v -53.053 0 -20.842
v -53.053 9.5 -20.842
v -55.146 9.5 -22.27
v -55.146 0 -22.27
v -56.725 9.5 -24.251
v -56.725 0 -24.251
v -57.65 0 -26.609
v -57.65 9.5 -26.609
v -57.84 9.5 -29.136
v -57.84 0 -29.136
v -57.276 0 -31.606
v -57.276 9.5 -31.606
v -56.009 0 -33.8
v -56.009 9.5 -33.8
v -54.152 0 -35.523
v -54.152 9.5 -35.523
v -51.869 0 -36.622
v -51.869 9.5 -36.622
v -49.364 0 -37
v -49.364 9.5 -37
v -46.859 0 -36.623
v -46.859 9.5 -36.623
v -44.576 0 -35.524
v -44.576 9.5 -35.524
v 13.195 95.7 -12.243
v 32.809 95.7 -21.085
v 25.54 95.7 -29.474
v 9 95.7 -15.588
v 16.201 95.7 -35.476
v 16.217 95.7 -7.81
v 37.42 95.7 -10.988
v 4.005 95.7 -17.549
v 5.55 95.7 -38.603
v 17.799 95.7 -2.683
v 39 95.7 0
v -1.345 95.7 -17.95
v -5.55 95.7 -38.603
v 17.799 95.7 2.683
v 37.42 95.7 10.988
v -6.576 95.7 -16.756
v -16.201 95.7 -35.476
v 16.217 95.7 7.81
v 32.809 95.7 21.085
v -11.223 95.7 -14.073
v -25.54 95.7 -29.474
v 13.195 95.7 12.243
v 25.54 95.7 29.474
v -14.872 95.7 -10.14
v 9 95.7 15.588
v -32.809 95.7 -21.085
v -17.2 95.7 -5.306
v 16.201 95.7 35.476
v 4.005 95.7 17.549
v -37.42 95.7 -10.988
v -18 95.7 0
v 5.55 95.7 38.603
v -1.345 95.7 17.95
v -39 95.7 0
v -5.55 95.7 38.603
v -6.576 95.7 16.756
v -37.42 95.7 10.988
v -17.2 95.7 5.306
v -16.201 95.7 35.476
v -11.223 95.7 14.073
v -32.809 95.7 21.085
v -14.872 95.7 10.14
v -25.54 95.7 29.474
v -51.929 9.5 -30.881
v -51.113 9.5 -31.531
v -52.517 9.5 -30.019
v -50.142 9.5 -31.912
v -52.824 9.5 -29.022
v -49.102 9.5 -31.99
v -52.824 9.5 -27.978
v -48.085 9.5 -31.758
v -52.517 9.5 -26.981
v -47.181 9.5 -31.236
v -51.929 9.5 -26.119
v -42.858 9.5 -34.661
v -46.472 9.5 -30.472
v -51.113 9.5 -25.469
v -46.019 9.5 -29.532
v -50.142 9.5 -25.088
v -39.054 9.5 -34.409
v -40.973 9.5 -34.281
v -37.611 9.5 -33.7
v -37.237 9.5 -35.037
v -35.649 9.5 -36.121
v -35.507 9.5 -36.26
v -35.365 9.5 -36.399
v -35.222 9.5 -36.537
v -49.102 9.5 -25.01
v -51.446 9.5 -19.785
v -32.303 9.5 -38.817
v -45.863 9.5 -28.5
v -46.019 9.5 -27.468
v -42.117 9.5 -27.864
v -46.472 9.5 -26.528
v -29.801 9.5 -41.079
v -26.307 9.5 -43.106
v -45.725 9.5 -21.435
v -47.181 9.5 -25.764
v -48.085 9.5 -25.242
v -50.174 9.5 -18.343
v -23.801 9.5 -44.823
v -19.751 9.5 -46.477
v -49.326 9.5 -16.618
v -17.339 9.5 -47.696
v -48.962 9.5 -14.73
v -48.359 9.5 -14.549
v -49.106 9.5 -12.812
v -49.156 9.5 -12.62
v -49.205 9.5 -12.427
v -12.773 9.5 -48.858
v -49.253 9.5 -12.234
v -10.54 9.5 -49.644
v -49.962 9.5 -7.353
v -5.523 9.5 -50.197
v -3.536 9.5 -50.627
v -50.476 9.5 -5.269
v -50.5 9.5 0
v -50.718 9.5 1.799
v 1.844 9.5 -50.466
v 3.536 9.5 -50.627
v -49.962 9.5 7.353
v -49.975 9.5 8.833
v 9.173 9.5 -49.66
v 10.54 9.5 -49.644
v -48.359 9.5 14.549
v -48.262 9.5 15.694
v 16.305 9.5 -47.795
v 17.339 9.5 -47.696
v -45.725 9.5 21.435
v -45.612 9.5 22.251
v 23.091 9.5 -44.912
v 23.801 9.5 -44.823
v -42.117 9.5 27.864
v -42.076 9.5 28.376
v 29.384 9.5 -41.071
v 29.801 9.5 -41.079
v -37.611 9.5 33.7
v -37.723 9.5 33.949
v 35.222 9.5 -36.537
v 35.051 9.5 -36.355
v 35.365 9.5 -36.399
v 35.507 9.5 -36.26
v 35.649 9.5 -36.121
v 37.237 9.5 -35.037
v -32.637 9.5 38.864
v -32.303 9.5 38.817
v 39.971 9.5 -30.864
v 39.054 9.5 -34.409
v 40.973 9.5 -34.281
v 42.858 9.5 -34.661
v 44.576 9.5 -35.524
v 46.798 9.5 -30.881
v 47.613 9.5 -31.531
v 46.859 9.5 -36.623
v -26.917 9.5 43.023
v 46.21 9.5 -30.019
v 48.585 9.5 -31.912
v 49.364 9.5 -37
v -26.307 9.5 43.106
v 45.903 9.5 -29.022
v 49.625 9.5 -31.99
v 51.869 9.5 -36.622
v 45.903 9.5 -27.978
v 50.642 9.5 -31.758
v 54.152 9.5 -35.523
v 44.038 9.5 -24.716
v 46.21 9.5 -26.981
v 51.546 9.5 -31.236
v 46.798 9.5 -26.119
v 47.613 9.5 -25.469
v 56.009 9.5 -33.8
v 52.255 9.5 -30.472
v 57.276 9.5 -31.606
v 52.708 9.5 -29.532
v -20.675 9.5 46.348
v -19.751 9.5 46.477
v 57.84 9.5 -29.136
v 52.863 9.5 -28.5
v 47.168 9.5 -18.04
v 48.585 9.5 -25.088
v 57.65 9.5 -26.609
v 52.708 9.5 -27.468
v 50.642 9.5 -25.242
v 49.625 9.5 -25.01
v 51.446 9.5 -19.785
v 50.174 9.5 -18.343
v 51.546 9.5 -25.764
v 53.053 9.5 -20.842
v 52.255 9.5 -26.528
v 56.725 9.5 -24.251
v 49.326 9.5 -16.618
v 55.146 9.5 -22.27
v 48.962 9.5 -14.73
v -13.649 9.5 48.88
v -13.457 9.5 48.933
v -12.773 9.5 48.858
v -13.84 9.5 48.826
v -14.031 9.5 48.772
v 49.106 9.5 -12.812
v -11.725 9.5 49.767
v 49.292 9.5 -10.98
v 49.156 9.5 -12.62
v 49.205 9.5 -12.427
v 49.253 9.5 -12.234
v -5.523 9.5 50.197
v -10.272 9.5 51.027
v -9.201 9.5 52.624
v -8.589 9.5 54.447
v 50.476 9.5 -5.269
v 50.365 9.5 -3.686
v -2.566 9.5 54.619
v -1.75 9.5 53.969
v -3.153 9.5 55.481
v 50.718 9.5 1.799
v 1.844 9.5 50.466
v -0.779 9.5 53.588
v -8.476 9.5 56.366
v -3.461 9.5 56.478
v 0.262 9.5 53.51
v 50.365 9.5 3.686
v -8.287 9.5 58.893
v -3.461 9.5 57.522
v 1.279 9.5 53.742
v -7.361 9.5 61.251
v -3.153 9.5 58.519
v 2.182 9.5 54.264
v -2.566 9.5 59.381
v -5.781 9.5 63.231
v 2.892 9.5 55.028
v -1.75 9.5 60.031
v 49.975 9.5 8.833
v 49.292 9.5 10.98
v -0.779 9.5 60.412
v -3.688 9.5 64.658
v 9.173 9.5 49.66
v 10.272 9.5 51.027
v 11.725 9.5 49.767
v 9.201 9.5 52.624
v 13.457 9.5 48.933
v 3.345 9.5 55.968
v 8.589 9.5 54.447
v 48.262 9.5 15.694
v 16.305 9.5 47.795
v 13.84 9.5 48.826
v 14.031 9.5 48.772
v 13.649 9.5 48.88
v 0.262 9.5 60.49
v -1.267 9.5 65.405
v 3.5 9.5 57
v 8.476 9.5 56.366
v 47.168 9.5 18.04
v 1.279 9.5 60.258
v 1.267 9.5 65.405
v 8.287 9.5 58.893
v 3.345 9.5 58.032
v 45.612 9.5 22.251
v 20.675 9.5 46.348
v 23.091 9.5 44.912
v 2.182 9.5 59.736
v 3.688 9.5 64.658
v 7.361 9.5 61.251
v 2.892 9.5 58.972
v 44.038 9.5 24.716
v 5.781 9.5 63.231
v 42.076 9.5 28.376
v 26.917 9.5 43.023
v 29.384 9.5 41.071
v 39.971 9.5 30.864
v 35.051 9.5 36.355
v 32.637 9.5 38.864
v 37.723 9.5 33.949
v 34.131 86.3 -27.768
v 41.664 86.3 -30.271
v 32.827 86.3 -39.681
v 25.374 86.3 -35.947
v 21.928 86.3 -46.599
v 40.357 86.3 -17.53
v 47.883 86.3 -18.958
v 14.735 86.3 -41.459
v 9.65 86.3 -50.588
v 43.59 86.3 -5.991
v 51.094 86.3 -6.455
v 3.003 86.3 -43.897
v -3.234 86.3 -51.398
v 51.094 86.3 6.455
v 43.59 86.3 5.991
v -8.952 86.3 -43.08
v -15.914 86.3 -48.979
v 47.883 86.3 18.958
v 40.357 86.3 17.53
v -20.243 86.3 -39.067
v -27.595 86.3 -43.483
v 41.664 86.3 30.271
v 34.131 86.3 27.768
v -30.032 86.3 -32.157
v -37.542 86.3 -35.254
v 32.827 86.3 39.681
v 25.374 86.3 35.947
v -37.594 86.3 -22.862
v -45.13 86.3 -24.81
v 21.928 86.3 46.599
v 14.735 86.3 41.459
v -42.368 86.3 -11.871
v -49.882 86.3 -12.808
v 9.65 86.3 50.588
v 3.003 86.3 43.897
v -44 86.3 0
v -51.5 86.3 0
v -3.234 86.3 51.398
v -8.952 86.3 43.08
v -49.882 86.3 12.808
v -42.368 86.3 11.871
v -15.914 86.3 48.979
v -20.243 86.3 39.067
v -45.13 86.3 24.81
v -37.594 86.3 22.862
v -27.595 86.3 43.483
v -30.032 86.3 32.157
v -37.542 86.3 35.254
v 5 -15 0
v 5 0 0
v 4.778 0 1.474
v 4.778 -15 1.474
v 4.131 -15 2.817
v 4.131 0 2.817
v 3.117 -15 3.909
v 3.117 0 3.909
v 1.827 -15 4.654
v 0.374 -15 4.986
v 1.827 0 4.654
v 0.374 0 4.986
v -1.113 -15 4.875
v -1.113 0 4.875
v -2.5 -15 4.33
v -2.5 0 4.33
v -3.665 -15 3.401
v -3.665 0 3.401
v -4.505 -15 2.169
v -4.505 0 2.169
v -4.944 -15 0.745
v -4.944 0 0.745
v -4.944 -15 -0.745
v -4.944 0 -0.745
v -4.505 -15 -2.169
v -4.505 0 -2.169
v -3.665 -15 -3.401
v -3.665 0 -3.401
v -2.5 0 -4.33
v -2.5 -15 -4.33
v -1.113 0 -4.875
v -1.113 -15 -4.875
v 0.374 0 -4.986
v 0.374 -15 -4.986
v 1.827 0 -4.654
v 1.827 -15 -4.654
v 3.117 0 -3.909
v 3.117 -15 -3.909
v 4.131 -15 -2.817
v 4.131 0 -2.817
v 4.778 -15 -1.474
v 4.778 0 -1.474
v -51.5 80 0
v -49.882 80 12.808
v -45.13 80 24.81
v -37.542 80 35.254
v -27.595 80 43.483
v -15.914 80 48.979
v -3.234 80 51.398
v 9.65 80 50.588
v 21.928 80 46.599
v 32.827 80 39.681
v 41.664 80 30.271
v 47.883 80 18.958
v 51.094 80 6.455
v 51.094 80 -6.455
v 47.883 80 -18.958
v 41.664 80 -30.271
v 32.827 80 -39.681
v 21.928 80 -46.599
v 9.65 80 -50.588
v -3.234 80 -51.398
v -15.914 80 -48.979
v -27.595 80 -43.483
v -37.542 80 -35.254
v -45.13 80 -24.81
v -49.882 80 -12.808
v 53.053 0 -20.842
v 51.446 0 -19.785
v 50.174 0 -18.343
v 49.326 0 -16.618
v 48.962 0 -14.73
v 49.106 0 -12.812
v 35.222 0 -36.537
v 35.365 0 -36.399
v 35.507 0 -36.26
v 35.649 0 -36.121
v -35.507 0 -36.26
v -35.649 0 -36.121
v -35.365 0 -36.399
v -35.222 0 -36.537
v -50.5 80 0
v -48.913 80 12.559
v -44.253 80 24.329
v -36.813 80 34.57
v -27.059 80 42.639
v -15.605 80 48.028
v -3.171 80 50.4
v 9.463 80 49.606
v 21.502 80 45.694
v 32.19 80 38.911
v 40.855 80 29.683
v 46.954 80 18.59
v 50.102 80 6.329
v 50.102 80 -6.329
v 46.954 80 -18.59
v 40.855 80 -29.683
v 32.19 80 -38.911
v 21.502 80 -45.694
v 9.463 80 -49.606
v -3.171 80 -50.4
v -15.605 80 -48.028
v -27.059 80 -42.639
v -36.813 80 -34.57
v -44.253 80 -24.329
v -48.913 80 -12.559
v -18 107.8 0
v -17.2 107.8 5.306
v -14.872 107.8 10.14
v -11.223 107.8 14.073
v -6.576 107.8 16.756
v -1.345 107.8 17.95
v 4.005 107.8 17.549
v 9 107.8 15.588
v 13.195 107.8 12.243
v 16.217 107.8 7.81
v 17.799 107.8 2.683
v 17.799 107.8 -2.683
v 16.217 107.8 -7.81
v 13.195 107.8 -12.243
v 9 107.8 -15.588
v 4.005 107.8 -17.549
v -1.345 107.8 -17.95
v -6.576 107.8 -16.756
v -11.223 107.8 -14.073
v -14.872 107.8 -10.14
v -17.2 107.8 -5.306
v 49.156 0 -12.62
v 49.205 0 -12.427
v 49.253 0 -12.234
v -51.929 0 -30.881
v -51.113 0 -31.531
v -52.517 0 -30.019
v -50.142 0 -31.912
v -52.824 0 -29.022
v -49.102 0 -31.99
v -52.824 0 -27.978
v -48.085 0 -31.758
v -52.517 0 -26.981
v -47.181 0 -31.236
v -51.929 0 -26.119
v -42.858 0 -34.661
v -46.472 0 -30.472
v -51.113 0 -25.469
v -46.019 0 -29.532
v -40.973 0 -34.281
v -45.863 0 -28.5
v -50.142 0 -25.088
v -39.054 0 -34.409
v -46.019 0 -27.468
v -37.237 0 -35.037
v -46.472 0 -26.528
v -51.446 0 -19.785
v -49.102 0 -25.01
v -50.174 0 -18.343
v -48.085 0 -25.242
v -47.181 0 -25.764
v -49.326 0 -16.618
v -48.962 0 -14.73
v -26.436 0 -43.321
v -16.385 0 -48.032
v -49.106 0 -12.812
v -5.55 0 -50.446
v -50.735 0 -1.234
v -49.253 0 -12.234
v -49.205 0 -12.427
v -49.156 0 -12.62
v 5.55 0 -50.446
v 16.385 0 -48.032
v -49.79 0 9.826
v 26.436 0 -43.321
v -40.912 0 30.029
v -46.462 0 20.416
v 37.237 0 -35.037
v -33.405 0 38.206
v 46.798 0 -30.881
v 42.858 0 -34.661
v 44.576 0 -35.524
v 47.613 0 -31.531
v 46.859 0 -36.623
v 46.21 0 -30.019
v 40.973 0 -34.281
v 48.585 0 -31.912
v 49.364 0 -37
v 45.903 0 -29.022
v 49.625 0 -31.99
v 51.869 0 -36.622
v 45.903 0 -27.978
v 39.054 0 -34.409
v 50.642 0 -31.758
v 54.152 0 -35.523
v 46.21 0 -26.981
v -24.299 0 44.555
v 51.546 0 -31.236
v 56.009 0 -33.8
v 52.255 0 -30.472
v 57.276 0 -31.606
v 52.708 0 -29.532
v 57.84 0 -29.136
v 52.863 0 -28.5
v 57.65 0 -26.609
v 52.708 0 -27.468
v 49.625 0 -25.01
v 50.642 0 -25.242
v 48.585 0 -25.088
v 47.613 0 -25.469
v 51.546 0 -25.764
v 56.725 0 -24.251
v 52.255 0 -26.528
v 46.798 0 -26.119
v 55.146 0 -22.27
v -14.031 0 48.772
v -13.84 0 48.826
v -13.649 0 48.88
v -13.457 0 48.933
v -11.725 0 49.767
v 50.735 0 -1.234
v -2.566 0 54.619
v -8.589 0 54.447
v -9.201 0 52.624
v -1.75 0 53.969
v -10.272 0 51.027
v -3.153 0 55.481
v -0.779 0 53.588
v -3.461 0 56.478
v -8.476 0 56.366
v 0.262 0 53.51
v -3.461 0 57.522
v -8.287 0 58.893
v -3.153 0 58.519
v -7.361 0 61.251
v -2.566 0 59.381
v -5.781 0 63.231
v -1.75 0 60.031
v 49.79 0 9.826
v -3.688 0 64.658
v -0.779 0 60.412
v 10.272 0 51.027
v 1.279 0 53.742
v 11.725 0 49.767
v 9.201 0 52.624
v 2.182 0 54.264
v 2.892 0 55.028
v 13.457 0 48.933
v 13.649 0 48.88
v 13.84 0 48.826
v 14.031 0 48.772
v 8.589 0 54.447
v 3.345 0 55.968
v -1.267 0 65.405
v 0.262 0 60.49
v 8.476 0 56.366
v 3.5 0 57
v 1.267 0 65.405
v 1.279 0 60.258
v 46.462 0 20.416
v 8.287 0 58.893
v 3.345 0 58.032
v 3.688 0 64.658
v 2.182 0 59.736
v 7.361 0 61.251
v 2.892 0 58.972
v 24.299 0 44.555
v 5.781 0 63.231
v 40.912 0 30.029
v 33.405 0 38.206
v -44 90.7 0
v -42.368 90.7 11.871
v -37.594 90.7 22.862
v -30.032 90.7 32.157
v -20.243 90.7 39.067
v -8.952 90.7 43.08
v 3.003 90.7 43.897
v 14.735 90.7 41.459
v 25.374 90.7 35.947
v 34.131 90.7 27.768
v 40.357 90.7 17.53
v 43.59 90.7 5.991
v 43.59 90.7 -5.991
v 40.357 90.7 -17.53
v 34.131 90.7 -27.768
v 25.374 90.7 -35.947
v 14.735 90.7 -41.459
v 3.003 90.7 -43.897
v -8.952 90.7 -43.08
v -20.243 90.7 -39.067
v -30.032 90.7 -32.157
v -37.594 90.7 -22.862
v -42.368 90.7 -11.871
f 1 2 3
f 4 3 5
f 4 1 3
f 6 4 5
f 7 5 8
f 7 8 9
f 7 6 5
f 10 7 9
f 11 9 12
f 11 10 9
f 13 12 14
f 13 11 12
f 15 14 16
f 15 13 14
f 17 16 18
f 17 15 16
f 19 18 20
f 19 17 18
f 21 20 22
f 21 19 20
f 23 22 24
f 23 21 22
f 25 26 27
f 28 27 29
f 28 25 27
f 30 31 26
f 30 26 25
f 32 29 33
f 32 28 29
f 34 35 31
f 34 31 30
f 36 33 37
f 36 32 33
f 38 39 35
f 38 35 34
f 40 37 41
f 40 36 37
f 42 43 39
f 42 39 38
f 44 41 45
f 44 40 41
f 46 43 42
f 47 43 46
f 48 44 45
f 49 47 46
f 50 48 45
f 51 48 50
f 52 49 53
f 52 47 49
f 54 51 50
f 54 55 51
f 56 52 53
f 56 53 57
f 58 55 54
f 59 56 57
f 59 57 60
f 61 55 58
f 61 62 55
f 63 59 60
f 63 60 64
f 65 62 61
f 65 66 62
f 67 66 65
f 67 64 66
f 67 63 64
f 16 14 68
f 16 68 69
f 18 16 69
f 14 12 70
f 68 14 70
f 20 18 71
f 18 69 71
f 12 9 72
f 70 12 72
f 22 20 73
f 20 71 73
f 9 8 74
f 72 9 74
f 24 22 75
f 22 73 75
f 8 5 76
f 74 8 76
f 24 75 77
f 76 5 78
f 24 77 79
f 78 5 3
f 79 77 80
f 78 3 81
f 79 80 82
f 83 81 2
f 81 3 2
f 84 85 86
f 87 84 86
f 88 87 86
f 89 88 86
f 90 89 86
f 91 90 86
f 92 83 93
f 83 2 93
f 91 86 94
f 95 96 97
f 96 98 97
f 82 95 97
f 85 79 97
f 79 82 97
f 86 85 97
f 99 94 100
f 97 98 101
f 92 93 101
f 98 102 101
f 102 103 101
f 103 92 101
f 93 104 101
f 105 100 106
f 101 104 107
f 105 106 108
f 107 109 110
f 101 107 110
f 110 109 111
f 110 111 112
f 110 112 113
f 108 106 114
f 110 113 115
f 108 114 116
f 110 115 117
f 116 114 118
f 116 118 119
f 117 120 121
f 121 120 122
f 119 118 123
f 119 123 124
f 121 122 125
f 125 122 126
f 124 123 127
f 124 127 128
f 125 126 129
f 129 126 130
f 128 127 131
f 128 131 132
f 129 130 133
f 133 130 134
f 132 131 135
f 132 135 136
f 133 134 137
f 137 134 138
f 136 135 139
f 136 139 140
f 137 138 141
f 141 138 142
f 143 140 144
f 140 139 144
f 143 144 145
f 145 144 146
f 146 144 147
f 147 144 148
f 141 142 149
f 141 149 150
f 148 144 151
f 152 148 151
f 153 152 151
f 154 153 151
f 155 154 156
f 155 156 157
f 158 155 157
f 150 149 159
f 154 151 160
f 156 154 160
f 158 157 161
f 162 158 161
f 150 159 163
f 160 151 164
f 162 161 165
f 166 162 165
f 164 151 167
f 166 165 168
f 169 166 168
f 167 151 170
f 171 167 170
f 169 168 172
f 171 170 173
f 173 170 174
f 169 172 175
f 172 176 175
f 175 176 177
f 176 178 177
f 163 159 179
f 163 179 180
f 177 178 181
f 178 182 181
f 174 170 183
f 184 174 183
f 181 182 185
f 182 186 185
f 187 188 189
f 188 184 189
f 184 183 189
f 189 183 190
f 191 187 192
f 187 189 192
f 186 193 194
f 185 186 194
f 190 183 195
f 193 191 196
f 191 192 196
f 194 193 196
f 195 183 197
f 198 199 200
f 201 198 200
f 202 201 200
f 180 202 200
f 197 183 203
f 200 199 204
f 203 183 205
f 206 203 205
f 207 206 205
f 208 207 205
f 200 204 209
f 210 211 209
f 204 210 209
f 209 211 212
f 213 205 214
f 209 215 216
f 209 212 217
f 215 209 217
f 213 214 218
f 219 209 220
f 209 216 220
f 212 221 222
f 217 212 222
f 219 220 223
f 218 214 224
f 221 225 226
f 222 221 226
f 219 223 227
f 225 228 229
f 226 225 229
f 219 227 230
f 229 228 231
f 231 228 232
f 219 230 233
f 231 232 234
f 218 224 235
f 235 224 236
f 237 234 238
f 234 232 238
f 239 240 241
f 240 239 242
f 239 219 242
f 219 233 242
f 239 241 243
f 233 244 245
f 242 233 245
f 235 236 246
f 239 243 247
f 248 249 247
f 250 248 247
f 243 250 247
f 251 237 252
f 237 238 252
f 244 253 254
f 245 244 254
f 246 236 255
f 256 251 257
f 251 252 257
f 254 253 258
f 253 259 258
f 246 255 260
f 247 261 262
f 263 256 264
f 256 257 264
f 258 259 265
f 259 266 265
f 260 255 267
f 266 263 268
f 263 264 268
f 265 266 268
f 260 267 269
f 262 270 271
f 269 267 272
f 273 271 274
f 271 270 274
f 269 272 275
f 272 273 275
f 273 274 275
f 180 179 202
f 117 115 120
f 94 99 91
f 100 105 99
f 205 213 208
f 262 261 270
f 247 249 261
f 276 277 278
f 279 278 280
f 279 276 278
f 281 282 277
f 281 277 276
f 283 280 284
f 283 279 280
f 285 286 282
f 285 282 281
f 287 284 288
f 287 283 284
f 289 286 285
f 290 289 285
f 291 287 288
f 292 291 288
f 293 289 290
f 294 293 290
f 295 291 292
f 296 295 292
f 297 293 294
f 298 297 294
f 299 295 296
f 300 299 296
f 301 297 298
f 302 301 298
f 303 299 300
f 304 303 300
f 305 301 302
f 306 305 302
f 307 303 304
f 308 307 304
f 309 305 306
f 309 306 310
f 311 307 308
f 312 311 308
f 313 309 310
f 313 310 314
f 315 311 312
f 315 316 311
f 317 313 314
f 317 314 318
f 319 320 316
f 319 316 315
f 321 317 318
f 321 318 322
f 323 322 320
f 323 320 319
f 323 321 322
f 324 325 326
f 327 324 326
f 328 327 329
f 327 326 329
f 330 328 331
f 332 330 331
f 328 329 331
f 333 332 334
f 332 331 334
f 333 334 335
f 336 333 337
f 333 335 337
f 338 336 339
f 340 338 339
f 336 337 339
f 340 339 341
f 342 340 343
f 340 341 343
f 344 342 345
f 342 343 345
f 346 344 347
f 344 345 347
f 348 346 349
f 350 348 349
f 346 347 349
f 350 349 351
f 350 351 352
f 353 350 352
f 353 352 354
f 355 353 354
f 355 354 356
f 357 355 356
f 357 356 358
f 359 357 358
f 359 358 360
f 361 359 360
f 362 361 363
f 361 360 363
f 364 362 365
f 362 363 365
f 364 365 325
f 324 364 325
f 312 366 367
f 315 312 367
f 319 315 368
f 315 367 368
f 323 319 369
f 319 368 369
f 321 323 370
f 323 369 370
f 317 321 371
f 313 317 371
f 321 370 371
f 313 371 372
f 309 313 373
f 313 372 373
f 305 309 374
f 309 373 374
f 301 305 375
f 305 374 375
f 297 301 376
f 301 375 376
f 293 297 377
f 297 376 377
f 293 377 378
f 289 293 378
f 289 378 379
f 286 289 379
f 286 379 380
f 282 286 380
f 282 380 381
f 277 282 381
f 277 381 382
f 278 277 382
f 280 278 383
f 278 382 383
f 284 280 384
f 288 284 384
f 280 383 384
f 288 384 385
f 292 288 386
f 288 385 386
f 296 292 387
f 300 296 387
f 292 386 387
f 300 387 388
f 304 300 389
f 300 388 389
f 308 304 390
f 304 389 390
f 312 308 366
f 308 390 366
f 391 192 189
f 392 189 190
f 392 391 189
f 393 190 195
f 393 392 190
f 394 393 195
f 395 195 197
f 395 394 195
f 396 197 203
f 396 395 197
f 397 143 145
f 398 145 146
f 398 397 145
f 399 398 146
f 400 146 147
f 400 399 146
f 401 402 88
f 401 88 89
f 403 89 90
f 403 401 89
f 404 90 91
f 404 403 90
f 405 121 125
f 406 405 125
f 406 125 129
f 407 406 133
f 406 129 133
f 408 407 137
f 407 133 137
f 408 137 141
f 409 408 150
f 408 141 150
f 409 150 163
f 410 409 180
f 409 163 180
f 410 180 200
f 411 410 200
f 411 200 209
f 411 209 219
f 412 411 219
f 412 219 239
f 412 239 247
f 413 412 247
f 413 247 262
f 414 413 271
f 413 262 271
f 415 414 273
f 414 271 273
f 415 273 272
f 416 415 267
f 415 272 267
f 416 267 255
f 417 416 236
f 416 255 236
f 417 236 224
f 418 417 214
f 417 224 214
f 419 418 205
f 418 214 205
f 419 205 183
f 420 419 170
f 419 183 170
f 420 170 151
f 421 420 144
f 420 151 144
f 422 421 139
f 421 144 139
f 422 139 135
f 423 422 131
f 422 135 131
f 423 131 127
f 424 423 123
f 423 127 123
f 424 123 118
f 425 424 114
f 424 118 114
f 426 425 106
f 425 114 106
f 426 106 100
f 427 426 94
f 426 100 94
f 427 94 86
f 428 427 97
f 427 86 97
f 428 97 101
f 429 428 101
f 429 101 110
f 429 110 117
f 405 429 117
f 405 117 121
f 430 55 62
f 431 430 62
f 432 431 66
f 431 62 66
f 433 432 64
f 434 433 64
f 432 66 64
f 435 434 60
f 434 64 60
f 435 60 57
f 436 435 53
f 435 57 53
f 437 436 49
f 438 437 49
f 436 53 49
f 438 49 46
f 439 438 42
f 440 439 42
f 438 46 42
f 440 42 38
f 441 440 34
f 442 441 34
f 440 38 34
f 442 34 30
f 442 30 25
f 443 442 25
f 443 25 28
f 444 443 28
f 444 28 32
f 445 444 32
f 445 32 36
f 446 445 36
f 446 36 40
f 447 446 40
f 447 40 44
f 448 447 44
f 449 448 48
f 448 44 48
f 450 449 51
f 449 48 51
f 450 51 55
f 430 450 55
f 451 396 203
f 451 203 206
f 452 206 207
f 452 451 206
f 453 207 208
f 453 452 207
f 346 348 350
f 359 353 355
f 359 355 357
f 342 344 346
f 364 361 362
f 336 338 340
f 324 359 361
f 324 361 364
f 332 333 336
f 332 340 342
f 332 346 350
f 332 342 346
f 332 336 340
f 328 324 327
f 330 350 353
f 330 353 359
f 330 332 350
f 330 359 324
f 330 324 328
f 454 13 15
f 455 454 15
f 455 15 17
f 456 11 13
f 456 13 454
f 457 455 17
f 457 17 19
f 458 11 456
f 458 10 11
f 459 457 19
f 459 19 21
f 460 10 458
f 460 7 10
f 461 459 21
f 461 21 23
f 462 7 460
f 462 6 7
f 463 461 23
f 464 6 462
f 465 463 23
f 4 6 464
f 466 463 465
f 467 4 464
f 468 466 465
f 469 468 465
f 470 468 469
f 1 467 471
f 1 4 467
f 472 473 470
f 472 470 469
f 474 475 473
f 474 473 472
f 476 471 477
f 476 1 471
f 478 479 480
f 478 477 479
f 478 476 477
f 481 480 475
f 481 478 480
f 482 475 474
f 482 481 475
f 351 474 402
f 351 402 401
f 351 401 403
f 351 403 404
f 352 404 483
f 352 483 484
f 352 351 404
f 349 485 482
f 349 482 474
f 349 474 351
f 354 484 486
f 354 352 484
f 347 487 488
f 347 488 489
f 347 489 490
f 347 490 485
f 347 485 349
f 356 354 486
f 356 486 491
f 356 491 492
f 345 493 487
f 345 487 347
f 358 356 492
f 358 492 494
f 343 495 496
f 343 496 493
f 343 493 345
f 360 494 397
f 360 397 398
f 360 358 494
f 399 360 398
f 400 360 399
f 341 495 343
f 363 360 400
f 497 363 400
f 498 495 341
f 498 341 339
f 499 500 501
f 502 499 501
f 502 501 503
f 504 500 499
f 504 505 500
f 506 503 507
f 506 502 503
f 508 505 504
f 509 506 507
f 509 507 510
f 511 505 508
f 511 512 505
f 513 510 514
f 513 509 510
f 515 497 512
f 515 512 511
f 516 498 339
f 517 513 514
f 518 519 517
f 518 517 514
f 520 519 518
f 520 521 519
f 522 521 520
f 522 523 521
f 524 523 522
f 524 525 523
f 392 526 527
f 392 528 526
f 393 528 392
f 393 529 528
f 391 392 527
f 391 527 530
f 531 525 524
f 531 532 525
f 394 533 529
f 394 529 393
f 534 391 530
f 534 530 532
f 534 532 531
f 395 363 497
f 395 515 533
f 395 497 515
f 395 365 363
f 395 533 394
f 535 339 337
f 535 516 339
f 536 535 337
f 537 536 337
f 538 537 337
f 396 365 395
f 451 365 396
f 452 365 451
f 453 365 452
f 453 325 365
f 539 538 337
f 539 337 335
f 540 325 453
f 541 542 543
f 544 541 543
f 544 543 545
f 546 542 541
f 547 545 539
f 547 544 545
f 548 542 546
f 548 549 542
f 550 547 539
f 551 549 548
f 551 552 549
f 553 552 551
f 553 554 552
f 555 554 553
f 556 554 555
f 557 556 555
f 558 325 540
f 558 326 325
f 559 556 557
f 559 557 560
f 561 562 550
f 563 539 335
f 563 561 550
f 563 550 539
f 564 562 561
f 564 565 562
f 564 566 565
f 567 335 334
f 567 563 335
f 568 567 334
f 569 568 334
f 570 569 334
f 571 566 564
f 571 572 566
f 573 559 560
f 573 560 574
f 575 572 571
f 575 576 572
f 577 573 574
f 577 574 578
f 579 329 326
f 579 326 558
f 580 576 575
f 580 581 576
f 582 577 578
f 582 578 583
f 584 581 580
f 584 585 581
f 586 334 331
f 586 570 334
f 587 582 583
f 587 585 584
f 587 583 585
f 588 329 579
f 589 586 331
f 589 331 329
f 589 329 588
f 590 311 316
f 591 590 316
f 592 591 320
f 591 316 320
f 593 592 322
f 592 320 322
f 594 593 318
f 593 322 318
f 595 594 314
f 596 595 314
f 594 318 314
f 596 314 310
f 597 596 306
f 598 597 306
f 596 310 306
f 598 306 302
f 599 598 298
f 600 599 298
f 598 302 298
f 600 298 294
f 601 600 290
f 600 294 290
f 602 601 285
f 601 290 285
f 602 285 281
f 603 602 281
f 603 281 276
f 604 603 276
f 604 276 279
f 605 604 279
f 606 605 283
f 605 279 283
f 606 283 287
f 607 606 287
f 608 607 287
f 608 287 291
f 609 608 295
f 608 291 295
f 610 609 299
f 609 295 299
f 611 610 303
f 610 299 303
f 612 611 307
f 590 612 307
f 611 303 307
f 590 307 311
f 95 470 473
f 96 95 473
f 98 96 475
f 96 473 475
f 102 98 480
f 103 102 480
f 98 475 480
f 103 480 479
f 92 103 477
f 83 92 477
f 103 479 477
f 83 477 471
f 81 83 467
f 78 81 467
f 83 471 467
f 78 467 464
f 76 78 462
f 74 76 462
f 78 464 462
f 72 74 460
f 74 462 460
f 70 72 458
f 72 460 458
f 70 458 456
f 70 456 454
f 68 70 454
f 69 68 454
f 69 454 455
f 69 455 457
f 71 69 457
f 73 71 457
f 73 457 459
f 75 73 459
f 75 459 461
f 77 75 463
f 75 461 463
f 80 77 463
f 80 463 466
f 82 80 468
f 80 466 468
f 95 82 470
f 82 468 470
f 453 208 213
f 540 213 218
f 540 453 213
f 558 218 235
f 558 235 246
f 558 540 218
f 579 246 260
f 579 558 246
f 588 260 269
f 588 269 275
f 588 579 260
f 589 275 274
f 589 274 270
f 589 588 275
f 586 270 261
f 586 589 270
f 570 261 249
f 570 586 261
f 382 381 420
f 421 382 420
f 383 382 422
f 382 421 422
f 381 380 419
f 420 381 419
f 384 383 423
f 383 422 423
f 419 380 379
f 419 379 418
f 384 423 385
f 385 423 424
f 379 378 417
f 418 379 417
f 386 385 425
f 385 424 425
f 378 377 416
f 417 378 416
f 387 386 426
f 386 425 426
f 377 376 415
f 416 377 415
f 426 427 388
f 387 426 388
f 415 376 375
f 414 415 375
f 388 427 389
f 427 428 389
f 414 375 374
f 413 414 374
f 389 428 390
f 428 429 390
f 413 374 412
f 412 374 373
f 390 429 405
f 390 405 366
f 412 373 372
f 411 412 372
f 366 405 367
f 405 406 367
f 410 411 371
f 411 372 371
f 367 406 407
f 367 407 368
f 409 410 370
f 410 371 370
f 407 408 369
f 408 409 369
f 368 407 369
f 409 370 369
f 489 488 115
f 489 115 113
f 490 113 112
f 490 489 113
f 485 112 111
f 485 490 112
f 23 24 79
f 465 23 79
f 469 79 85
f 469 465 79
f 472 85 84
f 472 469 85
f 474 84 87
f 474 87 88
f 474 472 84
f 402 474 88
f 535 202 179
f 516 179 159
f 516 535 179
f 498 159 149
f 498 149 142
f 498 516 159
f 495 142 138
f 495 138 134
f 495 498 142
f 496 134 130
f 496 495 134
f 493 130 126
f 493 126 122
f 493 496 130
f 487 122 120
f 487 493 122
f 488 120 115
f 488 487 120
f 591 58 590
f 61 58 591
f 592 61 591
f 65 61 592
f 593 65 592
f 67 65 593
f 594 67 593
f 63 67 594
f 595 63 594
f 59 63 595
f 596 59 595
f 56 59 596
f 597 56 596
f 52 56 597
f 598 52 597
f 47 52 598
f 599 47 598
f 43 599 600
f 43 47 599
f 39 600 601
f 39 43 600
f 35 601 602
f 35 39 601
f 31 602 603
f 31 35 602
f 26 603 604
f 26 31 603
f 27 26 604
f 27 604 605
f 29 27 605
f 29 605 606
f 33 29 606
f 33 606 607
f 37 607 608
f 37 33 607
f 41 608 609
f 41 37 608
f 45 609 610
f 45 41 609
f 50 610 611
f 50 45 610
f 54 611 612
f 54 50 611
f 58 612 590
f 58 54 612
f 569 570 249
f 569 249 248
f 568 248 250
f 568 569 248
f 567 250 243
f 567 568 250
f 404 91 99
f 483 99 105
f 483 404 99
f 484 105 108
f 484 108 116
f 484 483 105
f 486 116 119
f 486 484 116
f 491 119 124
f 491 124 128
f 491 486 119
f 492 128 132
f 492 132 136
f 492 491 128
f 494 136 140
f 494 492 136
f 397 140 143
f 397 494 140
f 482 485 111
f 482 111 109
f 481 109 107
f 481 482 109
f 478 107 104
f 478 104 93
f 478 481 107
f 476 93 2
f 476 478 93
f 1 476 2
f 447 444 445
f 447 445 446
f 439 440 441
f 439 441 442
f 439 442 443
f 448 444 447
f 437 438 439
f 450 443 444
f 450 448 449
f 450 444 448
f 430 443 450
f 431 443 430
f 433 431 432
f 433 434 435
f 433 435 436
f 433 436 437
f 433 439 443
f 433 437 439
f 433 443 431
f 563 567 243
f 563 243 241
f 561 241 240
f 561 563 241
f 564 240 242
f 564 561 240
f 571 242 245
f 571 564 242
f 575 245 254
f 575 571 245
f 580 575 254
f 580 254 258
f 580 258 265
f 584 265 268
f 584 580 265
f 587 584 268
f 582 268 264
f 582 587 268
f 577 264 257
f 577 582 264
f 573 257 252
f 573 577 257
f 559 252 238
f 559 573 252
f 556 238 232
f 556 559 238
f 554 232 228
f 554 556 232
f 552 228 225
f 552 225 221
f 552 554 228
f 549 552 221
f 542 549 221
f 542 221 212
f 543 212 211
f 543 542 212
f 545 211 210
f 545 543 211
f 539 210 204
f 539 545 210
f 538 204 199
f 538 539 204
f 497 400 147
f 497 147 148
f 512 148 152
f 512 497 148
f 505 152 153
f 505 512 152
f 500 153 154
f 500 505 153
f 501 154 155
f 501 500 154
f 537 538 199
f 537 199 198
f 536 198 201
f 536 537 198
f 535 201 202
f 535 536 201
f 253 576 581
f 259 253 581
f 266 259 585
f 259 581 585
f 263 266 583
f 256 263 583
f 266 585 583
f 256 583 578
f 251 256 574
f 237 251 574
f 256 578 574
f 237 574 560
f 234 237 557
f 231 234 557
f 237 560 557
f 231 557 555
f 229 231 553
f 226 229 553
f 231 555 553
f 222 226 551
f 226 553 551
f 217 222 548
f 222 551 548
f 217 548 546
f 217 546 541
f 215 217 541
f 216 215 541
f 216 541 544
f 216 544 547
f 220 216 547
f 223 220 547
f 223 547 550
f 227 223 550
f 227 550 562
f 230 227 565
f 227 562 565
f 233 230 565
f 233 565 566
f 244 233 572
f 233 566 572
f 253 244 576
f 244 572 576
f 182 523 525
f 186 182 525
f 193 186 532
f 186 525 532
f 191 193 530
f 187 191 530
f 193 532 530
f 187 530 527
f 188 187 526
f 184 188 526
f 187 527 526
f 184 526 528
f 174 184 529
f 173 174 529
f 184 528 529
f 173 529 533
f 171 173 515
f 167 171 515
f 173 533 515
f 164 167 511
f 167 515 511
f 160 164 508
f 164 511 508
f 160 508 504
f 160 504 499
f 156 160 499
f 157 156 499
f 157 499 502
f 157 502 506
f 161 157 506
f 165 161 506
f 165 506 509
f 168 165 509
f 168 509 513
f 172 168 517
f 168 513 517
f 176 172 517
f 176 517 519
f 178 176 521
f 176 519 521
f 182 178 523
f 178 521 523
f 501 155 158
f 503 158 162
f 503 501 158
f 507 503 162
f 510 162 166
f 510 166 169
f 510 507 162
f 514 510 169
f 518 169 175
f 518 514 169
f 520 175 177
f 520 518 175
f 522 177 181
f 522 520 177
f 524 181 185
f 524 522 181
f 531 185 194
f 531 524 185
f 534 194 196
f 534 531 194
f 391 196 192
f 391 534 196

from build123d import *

# Parameters (mm, degrees)
F0_R      = 3.5
F2_DEPTH  = 9.5
F1_R      = 5
F3_DEPTH  = 15
F4_R      = 50.5
F5_DEPTH  = 70.5
F6_R      = 51.5
F7_DEPTH  = 6.3
F8_R      = 44
F9_DEPTH  = 9.4
F10_R     = 18
F11_DEPTH = 12.1
F15_SIZE  = 5


with BuildPart() as f2:
    # F0 (on Front) → F2 (new body)
    with BuildSketch(Plane.XZ):
        with BuildLine():
            ThreePointArc((-14.031232, 48.771785), (-13.742652, 48.846608), (-13.457391, 48.933231))
            ThreePointArc((-13.457391, 48.933231), (-13.744549, 48.853351), (-14.031232, 48.771785))
        make_face()
        with BuildLine():
            ThreePointArc((-8.47634, 56.366228), (-9.68343, 51.789665), (-13.457391, 48.933231))
            ThreePointArc((-13.457391, 48.933231), (-13.742652, 48.846608), (-14.031232, 48.771785))
            ThreePointArc((-14.031232, 48.771785), (-43.950789, 25.375), (-49.253221, -12.234489))
            ThreePointArc((-49.253221, -12.234489), (-49.173729, -12.521818), (-49.106117, -12.812173))
            ThreePointArc((-49.106117, -12.812173), (-49.69288, -17.508736), (-53.052755, -20.842389))
            ThreePointArc((-53.052755, -20.842389), (-56.724664, -32.75), (-44.576416, -35.523839))
            ThreePointArc((-44.576416, -35.523839), (-40.009451, -34.280929), (-35.648726, -36.121058))
            ThreePointArc((-35.648726, -36.121058), (-35.431077, -36.324789), (-35.221989, -36.537296))
            ThreePointArc((-35.221989, -36.537296), (0, -50.75), (35.221989, -36.537296))
            ThreePointArc((35.221989, -36.537296), (35.431077, -36.324789), (35.648726, -36.121058))
            ThreePointArc((35.648726, -36.121058), (40.009451, -34.280929), (44.576416, -35.523839))
            ThreePointArc((44.576416, -35.523839), (56.724664, -32.75), (53.052755, -20.842389))
            ThreePointArc((53.052755, -20.842389), (49.69288, -17.508736), (49.106117, -12.812173))
            ThreePointArc((49.106117, -12.812173), (49.173729, -12.521818), (49.253221, -12.234489))
            ThreePointArc((49.253221, -12.234489), (43.950789, 25.375), (14.031232, 48.771785))
            ThreePointArc((14.031232, 48.771785), (13.742652, 48.846608), (13.457391, 48.933231))
            ThreePointArc((13.457391, 48.933231), (9.68343, 51.789665), (8.47634, 56.366228))
            ThreePointArc((8.47634, 56.366228), (0, 65.5), (-8.47634, 56.366228))
        make_face()
        with Locations((-49.363448, -28.5)):
            Circle(F0_R, mode=Mode.SUBTRACT)
        with Locations((49.363448, -28.5)):
            Circle(F0_R, mode=Mode.SUBTRACT)
        with Locations((0, 57)):
            Circle(F0_R, mode=Mode.SUBTRACT)
        with BuildLine():
            ThreePointArc((-49.106117, -12.812173), (-49.173729, -12.521818), (-49.253221, -12.234489))
            ThreePointArc((-49.253221, -12.234489), (-49.180517, -12.523547), (-49.106117, -12.812173))
        make_face()
        with BuildLine():
            ThreePointArc((14.031232, 48.771785), (13.744549, 48.853351), (13.457391, 48.933231))
            ThreePointArc((13.457391, 48.933231), (13.742652, 48.846608), (14.031232, 48.771785))
        make_face()
        with BuildLine():
            ThreePointArc((49.106117, -12.812173), (49.180517, -12.523547), (49.253221, -12.234489))
            ThreePointArc((49.253221, -12.234489), (49.173729, -12.521818), (49.106117, -12.812173))
        make_face()
        with BuildLine():
            ThreePointArc((-35.221989, -36.537296), (-35.431077, -36.324789), (-35.648726, -36.121058))
            ThreePointArc((-35.648726, -36.121058), (-35.435968, -36.329804), (-35.221989, -36.537296))
        make_face()
        with BuildLine():
            ThreePointArc((35.648726, -36.121058), (35.431077, -36.324789), (35.221989, -36.537296))
            ThreePointArc((35.221989, -36.537296), (35.435968, -36.329804), (35.648726, -36.121058))
        make_face()
    extrude(amount=-F2_DEPTH)

    # F1 (on face) → F3 (join)
    with BuildSketch(Plane.XZ):
        Circle(F1_R)
    extrude(amount=F3_DEPTH)

    # F4 (on face) → F5 (join)
    with BuildSketch(Plane(origin=(0, 9.5, 0), x_dir=(-1, 0, 0), z_dir=(0, 1, 0))):
        Circle(F4_R)
    extrude(amount=F5_DEPTH)

    # F6 (on face) → F7 (join)
    with BuildSketch(Plane(origin=(0, 80, 0), x_dir=(-1, 0, 0), z_dir=(0, 1, 0))):
        Circle(F6_R)
    extrude(amount=F7_DEPTH)

    # F8 (on face) → F9 (join)
    with BuildSketch(Plane(origin=(0, 86.3, 0), x_dir=(-1, 0, 0), z_dir=(0, 1, 0))):
        Circle(F8_R)
    extrude(amount=F9_DEPTH)

    # F10 (on face) → F11 (join)
    with BuildSketch(Plane(origin=(0, 95.7, 0), x_dir=(-1, 0, 0), z_dir=(0, 1, 0))):
        Circle(F10_R)
    extrude(amount=F11_DEPTH)

    # F15
    f15_edges = [f2.edges().sort_by_distance(p)[0] for p in [
        (44, 95.7, 0),
    ]]
    chamfer(f15_edges, length=F15_SIZE)


solid = f2.part
